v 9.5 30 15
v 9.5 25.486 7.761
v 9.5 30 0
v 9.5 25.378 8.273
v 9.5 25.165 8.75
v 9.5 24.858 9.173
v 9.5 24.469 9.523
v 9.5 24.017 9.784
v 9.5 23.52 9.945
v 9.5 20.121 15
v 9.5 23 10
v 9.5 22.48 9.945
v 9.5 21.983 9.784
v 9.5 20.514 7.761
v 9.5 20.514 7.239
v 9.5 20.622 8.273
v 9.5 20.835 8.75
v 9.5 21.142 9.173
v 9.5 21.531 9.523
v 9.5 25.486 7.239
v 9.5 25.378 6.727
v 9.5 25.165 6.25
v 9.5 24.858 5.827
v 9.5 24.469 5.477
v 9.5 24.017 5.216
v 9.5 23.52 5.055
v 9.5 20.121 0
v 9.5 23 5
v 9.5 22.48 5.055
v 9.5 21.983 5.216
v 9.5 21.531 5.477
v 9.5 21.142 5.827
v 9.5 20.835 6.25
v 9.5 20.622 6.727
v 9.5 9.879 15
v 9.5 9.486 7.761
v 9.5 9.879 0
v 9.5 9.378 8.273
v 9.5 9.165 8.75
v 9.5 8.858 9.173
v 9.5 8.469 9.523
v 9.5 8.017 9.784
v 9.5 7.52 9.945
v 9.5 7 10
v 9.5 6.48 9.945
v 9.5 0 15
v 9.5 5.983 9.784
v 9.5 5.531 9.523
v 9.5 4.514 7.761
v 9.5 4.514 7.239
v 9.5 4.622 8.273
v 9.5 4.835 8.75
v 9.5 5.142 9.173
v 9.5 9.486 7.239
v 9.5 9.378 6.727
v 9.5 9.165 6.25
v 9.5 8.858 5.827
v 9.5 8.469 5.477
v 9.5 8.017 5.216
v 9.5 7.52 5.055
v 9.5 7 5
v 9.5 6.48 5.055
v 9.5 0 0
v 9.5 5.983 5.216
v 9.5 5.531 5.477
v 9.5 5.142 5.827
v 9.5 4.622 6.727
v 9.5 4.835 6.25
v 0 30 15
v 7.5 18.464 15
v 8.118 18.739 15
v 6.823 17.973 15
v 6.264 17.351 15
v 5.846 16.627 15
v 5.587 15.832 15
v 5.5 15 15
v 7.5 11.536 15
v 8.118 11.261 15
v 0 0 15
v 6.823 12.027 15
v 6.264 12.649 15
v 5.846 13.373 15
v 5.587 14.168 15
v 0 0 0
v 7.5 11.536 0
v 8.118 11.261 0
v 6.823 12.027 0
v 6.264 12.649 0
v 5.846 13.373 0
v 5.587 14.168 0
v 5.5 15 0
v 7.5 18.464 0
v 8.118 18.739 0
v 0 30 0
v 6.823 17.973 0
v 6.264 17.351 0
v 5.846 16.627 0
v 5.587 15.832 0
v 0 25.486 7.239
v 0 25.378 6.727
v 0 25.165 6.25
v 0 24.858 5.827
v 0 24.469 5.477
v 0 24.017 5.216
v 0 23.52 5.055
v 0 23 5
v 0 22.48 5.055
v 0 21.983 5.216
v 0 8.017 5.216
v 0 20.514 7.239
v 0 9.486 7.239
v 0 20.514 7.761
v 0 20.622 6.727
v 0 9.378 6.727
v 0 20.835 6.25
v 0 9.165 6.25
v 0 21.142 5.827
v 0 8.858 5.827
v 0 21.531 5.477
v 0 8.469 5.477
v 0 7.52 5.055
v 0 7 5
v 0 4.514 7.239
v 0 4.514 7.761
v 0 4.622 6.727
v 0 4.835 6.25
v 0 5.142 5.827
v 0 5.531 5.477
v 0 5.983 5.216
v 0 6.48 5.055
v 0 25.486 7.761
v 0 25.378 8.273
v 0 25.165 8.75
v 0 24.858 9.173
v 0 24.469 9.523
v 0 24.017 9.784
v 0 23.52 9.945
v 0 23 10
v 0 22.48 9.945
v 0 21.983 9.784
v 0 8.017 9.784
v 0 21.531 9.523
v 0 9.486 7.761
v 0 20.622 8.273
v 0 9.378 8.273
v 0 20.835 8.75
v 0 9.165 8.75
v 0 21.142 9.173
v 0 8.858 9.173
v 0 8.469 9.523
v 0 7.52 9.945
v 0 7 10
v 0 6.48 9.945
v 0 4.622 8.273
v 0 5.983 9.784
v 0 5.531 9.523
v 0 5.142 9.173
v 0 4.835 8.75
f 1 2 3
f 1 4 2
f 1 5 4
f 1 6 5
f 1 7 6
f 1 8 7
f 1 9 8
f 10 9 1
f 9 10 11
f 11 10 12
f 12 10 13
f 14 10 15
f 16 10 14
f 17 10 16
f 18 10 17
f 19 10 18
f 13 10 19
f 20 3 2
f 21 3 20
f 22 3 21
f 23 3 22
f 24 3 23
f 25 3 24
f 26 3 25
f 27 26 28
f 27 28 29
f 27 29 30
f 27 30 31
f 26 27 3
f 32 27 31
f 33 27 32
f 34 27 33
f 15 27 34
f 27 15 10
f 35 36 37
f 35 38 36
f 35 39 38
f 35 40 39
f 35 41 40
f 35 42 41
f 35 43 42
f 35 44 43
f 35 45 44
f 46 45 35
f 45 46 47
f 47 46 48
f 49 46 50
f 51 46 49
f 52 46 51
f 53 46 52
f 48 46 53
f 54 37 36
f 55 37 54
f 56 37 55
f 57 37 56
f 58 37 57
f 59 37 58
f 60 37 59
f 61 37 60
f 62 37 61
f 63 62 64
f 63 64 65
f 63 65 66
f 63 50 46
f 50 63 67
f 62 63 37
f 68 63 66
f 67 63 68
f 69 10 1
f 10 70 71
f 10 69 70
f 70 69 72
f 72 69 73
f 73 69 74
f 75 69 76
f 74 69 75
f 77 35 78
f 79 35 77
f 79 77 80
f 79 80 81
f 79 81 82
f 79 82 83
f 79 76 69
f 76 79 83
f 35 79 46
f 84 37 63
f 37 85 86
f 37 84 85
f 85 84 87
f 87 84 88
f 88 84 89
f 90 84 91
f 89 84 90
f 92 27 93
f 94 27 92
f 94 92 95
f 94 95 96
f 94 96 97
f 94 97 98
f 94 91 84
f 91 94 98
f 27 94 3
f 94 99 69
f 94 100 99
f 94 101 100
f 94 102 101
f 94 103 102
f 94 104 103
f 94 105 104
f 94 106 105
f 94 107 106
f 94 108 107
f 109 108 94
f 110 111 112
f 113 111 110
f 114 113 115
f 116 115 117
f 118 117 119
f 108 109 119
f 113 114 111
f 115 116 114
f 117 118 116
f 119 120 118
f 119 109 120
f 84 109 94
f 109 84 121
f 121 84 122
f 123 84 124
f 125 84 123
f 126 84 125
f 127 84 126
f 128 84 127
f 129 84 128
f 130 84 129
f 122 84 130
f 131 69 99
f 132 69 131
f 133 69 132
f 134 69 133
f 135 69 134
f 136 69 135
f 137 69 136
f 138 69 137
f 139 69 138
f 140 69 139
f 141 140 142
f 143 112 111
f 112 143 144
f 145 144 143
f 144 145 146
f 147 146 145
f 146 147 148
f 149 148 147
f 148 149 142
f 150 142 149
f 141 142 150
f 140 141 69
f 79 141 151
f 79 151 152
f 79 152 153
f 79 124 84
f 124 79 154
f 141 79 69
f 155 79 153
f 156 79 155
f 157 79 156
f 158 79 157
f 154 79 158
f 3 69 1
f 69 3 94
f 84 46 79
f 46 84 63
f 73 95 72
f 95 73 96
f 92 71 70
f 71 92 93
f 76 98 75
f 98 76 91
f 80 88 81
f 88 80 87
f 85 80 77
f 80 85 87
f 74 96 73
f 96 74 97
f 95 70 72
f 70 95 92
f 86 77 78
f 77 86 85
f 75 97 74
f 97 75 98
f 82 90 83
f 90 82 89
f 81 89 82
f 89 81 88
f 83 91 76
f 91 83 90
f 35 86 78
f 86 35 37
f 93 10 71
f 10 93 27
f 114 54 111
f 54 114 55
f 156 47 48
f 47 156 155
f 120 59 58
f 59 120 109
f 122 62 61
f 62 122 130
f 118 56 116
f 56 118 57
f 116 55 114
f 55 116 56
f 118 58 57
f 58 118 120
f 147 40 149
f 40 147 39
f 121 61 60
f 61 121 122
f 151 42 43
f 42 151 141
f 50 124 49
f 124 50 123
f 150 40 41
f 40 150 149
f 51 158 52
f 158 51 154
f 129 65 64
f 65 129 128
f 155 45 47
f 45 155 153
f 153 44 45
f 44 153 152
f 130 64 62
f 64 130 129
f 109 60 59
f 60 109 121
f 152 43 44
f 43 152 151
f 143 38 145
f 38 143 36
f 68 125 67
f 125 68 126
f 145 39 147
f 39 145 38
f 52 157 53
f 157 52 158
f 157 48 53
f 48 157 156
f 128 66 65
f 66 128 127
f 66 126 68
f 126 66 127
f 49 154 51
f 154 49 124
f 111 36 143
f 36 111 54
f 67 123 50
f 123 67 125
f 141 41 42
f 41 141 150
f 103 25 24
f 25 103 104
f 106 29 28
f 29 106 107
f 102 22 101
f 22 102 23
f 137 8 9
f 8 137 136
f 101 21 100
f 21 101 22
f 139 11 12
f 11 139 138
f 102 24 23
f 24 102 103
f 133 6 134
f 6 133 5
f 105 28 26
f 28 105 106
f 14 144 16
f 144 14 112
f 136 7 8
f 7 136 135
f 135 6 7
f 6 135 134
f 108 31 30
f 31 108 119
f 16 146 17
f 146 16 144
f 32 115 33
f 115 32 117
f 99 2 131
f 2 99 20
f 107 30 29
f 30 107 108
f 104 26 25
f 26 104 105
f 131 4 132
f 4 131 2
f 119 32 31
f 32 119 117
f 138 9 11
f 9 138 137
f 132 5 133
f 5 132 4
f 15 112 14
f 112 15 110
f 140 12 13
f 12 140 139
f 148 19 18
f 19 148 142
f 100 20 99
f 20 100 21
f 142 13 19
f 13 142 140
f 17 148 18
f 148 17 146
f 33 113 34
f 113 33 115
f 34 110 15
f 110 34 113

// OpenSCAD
// file: config.scad
/**
 * Глобальный конфигурационный файл
 */
// качество цилиндров
$fn=30;

// избегание совпадения граней
DELTA=0.1;

// толщина рамы
FRAME=15;
// main file
include <config.scad>

x=17-FRAME/2;
y=30;
z=FRAME;

// difference between details
delta=0.05;

module frame_part04() {
difference() {
	cube([x,y,z]);
	translate([x,y/2,-1])cylinder(r=4,h=z+2);
	translate([x,y/2-1.5*sqrt(2)-3,-1])rotate([0,0,45])cube([3,3,z+2]);
	translate([x,y/2-1.5*sqrt(2)+3,-1])rotate([0,0,45])cube([3,3,z+2]);
	translate([-1,y/2-8,z/2])rotate([0,90,0])cylinder(r=2.5,h=x+2);
	//translate([-1,7,9])rotate([0,90,0])cylinder(r=4.25,h=5.6);
	translate([-1,y/2+8,z/2])rotate([0,90,0])cylinder(r=2.5,h=x+2);
	//translate([-1,23,9])rotate([0,90,0])cylinder(r=4.25,h=5.6);
}
}

frame_part04();
